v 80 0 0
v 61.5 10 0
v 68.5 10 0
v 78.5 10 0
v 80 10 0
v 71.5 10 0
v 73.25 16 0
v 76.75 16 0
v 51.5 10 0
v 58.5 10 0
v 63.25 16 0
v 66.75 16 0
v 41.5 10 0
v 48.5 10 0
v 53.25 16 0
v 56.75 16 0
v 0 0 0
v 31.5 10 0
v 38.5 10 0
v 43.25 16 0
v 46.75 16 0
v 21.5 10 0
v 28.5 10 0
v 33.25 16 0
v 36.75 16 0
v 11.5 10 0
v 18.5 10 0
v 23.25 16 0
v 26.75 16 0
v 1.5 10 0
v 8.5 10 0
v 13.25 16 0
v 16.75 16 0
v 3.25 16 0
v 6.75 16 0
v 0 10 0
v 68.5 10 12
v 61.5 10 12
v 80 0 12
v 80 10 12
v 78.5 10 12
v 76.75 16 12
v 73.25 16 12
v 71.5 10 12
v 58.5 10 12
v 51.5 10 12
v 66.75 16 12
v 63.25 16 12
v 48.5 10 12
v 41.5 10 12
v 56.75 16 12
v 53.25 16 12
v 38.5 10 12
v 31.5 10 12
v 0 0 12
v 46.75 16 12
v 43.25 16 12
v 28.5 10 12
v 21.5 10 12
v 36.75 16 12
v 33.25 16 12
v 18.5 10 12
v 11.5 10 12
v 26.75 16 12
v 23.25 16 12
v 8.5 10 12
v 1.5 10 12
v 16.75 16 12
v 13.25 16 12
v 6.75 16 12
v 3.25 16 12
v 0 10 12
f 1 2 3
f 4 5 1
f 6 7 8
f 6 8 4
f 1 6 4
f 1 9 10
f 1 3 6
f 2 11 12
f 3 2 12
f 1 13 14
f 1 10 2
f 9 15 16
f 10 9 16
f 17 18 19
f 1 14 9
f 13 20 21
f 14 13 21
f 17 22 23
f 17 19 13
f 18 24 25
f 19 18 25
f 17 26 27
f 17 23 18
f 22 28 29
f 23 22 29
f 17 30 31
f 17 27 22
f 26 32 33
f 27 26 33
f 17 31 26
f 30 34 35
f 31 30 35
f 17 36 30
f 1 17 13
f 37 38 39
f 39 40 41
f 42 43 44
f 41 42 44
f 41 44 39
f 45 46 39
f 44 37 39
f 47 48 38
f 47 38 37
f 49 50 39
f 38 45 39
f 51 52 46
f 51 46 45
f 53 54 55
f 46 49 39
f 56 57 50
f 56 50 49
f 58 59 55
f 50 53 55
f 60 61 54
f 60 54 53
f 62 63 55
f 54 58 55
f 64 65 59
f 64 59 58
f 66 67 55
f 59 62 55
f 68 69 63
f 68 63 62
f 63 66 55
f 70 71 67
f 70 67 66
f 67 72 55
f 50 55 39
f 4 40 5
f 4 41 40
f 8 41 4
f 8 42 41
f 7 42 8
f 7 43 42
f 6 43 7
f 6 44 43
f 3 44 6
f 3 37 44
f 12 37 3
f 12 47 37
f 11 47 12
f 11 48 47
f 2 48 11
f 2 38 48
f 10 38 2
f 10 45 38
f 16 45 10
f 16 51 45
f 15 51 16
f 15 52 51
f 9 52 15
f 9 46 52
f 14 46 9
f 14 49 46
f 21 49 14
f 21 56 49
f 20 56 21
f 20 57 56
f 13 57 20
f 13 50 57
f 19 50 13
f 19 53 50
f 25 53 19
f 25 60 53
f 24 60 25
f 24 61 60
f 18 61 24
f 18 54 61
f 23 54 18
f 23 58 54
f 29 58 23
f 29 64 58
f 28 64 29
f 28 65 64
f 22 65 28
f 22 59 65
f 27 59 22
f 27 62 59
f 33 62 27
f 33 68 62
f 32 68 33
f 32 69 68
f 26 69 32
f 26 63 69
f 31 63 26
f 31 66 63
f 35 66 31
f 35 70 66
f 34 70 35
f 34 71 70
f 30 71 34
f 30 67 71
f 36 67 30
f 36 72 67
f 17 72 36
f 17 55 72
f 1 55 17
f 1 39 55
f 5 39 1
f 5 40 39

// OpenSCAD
$fn = 32;

// ----------------------------------------------------------------------
// Gear rack: 8 teeth, pitch 10 mm
// ----------------------------------------------------------------------

// --- parameters (mm) ---
teeth = 8;                // number of teeth
pitch = 10;               // tooth pitch, X
root_w = 7;               // tooth width at the root
tip_w = 3.5;              // tooth width at the tip
base_h = 10;              // rack body height, Y
tooth_h = 6;              // tooth height above the body
plate_t = 12;             // rack width, Z (extrusion height)
fit_tol = 0.02;           // declared fit tolerance (prompt contract)
free_tol = 0.2;           // declared free tolerance (prompt contract)

rack_l = teeth * pitch;  // overall length
total_h = base_h + tooth_h;  // overall height

profile = [[0, 0], [80, 0], [80, 10], [78.5, 10], [76.75, 16], [73.25, 16], [71.5, 10], [68.5, 10], [66.75, 16], [63.25, 16], [61.5, 10], [58.5, 10], [56.75, 16], [53.25, 16], [51.5, 10], [48.5, 10], [46.75, 16], [43.25, 16], [41.5, 10], [38.5, 10], [36.75, 16], [33.25, 16], [31.5, 10], [28.5, 10], [26.75, 16], [23.25, 16], [21.5, 10], [18.5, 10], [16.75, 16], [13.25, 16], [11.5, 10], [8.5, 10], [6.75, 16], [3.25, 16], [1.5, 10], [0, 10]];  // primary outline, 36 points, counter clockwise

// --- the one profile operation ---
linear_extrude(height = plate_t) polygon(points = profile);
